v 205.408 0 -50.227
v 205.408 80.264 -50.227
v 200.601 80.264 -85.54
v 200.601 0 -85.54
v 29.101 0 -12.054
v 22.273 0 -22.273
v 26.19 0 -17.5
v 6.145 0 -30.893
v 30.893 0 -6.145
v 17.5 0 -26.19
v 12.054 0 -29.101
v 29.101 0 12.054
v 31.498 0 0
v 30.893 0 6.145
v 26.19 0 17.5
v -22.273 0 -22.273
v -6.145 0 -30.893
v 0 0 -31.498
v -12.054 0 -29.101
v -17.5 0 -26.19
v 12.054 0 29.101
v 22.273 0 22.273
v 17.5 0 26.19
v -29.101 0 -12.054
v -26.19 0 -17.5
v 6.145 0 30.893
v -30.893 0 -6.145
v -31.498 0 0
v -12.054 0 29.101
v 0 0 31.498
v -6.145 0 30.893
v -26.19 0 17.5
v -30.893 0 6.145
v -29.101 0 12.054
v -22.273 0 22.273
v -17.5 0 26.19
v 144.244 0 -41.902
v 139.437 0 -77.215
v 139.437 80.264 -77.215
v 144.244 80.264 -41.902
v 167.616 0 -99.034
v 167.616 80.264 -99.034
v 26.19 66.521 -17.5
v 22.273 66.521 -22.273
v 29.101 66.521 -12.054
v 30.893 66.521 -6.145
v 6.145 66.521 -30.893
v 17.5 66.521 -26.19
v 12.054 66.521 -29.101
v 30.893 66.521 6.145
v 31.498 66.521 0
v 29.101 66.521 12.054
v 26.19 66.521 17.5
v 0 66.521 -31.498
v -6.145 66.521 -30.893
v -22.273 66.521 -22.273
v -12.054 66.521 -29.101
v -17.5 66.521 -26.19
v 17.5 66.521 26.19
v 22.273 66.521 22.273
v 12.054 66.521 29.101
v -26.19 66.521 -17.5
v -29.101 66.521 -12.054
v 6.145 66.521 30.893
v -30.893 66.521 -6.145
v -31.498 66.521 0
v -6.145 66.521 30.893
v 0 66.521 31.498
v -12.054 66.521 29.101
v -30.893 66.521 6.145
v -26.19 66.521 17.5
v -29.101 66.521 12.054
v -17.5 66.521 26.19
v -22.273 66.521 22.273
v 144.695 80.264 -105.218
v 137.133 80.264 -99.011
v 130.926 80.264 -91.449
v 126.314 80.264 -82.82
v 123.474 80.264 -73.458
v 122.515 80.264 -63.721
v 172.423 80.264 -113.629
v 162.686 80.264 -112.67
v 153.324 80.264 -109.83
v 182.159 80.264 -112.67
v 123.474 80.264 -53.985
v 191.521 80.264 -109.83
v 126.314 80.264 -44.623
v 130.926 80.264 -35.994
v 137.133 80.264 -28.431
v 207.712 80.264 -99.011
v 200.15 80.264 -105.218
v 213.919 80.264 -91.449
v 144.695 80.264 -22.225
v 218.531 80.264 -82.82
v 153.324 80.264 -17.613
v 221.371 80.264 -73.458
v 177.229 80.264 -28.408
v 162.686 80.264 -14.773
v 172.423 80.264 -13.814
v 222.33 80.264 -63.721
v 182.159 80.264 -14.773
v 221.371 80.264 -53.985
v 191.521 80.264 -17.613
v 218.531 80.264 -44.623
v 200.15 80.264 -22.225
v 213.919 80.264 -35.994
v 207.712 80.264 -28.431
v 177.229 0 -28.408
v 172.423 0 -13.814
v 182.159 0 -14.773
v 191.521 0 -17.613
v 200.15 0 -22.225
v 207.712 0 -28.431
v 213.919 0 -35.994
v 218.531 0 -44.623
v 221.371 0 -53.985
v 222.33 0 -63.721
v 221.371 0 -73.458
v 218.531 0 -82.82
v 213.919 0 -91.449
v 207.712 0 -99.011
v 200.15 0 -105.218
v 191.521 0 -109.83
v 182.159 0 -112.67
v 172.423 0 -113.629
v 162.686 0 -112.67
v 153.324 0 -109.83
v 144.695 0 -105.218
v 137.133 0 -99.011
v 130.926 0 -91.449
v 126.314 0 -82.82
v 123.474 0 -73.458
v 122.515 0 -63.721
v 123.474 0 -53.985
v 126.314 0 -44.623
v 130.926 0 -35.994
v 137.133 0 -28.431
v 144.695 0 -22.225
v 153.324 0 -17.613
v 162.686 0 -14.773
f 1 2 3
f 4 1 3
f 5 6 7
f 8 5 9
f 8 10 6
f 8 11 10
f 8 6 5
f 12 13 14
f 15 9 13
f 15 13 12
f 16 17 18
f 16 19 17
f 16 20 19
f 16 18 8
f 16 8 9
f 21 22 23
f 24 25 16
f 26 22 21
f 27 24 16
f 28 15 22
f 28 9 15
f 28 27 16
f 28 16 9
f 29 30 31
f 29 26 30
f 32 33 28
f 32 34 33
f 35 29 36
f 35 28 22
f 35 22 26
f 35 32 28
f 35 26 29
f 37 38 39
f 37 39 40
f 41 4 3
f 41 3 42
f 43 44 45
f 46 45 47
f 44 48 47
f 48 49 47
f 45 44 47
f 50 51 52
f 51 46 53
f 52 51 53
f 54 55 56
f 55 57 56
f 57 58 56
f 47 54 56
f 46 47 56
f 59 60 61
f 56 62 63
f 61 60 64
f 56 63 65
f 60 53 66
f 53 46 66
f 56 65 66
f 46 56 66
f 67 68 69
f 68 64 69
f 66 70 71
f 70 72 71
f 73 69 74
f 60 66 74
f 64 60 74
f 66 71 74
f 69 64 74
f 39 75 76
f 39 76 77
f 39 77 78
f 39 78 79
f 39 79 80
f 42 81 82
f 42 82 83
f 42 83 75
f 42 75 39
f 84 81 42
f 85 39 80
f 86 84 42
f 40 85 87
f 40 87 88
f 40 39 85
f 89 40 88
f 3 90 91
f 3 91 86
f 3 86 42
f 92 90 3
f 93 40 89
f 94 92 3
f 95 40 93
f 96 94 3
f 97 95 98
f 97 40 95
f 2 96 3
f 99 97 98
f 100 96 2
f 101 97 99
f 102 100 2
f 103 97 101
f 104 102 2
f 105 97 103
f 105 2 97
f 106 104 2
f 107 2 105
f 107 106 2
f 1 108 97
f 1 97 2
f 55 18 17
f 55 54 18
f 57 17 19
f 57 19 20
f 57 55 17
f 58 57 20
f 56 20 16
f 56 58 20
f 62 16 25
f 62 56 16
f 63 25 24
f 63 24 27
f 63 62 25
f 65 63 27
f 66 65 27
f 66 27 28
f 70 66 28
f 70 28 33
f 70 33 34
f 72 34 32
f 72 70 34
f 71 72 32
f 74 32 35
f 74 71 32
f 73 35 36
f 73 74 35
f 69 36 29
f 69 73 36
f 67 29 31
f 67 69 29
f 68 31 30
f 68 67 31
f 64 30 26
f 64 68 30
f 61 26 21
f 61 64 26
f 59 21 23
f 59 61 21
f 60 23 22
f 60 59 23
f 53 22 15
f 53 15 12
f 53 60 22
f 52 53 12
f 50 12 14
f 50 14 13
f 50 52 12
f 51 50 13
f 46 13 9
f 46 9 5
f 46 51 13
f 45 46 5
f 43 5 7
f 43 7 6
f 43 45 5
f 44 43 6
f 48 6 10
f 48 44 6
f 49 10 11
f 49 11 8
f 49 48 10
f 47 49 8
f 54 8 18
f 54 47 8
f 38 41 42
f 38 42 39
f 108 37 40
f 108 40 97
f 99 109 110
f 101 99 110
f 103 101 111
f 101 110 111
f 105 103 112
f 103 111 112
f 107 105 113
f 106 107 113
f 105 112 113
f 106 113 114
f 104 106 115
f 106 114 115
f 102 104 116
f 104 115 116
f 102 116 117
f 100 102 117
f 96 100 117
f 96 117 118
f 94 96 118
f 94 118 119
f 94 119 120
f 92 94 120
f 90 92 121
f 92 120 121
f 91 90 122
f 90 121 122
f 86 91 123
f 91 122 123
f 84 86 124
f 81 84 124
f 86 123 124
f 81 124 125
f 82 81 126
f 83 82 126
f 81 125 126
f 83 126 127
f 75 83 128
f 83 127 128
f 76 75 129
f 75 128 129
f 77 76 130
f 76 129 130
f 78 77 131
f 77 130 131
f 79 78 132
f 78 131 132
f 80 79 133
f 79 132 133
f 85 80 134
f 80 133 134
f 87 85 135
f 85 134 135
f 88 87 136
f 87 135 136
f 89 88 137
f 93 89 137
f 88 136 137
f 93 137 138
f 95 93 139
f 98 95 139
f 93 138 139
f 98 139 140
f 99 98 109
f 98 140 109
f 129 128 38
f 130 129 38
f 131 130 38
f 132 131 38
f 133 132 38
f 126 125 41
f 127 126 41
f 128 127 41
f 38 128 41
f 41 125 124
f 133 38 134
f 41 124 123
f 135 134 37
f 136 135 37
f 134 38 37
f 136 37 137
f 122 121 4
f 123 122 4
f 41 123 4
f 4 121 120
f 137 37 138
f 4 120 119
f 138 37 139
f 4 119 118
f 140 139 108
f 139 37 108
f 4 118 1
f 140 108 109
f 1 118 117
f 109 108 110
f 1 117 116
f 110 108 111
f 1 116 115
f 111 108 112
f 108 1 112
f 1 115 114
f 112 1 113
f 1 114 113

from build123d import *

# Parameters (mm, degrees)
SKETCH1_W           = 31.498362362
SKETCH1_H           = 66.521017017
SKETCH2_R           = 49.907526652
BOSS_EXTRUDE1_DEPTH = 80.264


with BuildPart() as part:
    # Sketch1 → Revolve1 (revolve)
    with BuildSketch(Plane.XY, mode=Mode.PRIVATE) as revolve1_sk:
        with Locations((15.749181181, 33.260508509)):
            Rectangle(SKETCH1_W, SKETCH1_H)
    revolve(revolve1_sk.sketch.rotate(Axis((0, 0, 0), (0, 1, 0)), 90), axis=Axis((0, 0, 0), (0, 1, 0)))


with BuildPart() as body_2:
    # Sketch2 → Boss-Extrude1 (new body)
    with BuildSketch(Plane(origin=(0, 0, 0), x_dir=(1, 0, 0), z_dir=(0, 1, 0))):
        with Locations(Location((172.422527698, 63.721368932, 0), (0, 0, 270))):
            Circle(SKETCH2_R)
        Polygon((205.40770691, 50.227431982), (200.6012095, 85.540403603), (167.616030289, 99.034340553), (139.437348487, 77.215305882), (144.243845896, 41.902334261), (177.229025108, 28.408397311), align=None, mode=Mode.SUBTRACT)
    extrude(amount=BOSS_EXTRUDE1_DEPTH)


solid = Compound([part.part, body_2.part])
